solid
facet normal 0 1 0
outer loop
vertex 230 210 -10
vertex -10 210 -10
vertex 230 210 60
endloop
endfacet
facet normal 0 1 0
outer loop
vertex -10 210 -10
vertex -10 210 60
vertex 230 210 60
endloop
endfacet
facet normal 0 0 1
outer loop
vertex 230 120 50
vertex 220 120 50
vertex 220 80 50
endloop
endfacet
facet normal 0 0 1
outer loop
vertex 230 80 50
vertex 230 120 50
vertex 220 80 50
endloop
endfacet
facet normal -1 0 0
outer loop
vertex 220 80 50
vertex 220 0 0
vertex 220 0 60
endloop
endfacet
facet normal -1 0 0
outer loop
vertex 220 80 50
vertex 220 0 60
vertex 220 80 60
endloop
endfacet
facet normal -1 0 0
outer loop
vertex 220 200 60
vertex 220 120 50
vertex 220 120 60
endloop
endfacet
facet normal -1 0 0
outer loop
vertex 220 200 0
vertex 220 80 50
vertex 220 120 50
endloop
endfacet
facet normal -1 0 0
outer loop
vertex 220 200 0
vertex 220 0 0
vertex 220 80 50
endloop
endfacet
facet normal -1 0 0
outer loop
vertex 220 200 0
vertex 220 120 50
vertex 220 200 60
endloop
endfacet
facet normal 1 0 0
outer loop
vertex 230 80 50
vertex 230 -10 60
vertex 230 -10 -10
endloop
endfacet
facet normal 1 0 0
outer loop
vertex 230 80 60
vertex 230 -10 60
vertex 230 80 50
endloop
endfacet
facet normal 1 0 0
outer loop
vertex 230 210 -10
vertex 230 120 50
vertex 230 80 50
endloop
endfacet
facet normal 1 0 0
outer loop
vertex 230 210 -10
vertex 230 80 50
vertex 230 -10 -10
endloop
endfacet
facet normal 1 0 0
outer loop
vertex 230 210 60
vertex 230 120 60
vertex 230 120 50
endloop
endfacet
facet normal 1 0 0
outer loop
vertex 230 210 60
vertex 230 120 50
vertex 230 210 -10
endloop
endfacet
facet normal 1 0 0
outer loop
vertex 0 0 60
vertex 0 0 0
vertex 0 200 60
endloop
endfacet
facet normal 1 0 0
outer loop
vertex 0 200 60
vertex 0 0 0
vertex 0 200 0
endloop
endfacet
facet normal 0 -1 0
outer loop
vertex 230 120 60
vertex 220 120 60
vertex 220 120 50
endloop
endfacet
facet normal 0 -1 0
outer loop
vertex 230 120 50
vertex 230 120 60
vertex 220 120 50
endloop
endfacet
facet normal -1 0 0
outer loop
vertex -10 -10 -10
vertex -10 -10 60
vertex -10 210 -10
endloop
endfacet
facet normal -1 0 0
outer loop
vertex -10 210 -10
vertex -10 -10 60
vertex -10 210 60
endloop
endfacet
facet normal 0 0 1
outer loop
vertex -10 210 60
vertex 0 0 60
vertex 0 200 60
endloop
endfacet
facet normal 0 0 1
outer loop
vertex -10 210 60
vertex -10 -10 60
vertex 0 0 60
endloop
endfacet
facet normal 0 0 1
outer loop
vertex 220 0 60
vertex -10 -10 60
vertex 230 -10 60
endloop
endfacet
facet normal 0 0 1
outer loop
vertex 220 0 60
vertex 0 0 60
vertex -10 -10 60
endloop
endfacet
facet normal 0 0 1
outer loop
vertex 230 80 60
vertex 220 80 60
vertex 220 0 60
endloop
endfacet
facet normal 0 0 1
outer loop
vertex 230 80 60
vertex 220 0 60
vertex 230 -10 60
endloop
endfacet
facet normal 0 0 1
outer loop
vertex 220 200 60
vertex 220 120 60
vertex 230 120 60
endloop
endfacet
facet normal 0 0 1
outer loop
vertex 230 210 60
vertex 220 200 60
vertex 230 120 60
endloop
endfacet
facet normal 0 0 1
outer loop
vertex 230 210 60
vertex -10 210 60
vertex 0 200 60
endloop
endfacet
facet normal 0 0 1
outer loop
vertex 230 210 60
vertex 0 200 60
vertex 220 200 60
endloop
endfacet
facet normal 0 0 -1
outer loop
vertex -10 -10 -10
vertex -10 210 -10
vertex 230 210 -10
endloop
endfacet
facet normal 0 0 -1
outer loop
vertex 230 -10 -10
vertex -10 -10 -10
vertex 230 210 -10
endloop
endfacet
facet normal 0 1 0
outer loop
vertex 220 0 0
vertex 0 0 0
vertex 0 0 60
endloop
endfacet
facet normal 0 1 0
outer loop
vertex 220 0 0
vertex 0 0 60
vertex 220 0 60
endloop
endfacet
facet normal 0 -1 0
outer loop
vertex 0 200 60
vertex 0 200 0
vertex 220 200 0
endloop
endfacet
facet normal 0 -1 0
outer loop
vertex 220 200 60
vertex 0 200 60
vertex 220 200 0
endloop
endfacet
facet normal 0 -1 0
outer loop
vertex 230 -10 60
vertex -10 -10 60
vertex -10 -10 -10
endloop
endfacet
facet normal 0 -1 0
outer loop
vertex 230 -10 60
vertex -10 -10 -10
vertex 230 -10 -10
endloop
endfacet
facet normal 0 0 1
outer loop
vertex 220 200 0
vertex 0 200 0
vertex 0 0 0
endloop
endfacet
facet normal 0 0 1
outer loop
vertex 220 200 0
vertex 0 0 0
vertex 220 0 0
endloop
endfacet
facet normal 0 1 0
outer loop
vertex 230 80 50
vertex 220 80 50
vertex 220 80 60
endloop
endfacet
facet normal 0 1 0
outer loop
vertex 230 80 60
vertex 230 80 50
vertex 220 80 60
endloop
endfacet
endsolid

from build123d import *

# Parameters (mm, degrees)
ESQUISSE1_W              = 240
ESQUISSE1_H              = 220
ESQUISSE1_W_2            = 220
ESQUISSE1_H_2            = 200
BOSS_EXTRU_3_DEPTH       = 60
ESQUISSE1_2_W            = 240
ESQUISSE1_2_H            = 220
BOSS_EXTRU_4_DEPTH       = 10
ENL_V_MAT_EXTRU_17_DEPTH = 318.175030543


with BuildPart() as part:
    # Esquisse1 → Boss.-Extru.3 (new body)
    with BuildSketch(Plane.XY):
        with Locations((110, 100)):
            Rectangle(ESQUISSE1_W, ESQUISSE1_H)
        with Locations((110, 100)):
            Rectangle(ESQUISSE1_W_2, ESQUISSE1_H_2, mode=Mode.SUBTRACT)
    extrude(amount=BOSS_EXTRU_3_DEPTH)

    # Esquisse1<2> → Boss.-Extru.4 (add)
    with BuildSketch(Plane.XY):
        with Locations((110, 100)):
            Rectangle(ESQUISSE1_2_W, ESQUISSE1_2_H)
    extrude(amount=-BOSS_EXTRU_4_DEPTH)

    # Esquisse4 → Enlèv. mat.-Extru.17 (cut, through all)
    with BuildSketch(Plane.ZY.offset(-220)):
        Polygon((365.296461205, 120), (60, 120), (50, 120), (50, 80), (60, 80), (365.296461205, 80), (975.889383614, 80), (975.889383614, 120), align=None)
    extrude(amount=-ENL_V_MAT_EXTRU_17_DEPTH, mode=Mode.SUBTRACT)


solid = part.part
